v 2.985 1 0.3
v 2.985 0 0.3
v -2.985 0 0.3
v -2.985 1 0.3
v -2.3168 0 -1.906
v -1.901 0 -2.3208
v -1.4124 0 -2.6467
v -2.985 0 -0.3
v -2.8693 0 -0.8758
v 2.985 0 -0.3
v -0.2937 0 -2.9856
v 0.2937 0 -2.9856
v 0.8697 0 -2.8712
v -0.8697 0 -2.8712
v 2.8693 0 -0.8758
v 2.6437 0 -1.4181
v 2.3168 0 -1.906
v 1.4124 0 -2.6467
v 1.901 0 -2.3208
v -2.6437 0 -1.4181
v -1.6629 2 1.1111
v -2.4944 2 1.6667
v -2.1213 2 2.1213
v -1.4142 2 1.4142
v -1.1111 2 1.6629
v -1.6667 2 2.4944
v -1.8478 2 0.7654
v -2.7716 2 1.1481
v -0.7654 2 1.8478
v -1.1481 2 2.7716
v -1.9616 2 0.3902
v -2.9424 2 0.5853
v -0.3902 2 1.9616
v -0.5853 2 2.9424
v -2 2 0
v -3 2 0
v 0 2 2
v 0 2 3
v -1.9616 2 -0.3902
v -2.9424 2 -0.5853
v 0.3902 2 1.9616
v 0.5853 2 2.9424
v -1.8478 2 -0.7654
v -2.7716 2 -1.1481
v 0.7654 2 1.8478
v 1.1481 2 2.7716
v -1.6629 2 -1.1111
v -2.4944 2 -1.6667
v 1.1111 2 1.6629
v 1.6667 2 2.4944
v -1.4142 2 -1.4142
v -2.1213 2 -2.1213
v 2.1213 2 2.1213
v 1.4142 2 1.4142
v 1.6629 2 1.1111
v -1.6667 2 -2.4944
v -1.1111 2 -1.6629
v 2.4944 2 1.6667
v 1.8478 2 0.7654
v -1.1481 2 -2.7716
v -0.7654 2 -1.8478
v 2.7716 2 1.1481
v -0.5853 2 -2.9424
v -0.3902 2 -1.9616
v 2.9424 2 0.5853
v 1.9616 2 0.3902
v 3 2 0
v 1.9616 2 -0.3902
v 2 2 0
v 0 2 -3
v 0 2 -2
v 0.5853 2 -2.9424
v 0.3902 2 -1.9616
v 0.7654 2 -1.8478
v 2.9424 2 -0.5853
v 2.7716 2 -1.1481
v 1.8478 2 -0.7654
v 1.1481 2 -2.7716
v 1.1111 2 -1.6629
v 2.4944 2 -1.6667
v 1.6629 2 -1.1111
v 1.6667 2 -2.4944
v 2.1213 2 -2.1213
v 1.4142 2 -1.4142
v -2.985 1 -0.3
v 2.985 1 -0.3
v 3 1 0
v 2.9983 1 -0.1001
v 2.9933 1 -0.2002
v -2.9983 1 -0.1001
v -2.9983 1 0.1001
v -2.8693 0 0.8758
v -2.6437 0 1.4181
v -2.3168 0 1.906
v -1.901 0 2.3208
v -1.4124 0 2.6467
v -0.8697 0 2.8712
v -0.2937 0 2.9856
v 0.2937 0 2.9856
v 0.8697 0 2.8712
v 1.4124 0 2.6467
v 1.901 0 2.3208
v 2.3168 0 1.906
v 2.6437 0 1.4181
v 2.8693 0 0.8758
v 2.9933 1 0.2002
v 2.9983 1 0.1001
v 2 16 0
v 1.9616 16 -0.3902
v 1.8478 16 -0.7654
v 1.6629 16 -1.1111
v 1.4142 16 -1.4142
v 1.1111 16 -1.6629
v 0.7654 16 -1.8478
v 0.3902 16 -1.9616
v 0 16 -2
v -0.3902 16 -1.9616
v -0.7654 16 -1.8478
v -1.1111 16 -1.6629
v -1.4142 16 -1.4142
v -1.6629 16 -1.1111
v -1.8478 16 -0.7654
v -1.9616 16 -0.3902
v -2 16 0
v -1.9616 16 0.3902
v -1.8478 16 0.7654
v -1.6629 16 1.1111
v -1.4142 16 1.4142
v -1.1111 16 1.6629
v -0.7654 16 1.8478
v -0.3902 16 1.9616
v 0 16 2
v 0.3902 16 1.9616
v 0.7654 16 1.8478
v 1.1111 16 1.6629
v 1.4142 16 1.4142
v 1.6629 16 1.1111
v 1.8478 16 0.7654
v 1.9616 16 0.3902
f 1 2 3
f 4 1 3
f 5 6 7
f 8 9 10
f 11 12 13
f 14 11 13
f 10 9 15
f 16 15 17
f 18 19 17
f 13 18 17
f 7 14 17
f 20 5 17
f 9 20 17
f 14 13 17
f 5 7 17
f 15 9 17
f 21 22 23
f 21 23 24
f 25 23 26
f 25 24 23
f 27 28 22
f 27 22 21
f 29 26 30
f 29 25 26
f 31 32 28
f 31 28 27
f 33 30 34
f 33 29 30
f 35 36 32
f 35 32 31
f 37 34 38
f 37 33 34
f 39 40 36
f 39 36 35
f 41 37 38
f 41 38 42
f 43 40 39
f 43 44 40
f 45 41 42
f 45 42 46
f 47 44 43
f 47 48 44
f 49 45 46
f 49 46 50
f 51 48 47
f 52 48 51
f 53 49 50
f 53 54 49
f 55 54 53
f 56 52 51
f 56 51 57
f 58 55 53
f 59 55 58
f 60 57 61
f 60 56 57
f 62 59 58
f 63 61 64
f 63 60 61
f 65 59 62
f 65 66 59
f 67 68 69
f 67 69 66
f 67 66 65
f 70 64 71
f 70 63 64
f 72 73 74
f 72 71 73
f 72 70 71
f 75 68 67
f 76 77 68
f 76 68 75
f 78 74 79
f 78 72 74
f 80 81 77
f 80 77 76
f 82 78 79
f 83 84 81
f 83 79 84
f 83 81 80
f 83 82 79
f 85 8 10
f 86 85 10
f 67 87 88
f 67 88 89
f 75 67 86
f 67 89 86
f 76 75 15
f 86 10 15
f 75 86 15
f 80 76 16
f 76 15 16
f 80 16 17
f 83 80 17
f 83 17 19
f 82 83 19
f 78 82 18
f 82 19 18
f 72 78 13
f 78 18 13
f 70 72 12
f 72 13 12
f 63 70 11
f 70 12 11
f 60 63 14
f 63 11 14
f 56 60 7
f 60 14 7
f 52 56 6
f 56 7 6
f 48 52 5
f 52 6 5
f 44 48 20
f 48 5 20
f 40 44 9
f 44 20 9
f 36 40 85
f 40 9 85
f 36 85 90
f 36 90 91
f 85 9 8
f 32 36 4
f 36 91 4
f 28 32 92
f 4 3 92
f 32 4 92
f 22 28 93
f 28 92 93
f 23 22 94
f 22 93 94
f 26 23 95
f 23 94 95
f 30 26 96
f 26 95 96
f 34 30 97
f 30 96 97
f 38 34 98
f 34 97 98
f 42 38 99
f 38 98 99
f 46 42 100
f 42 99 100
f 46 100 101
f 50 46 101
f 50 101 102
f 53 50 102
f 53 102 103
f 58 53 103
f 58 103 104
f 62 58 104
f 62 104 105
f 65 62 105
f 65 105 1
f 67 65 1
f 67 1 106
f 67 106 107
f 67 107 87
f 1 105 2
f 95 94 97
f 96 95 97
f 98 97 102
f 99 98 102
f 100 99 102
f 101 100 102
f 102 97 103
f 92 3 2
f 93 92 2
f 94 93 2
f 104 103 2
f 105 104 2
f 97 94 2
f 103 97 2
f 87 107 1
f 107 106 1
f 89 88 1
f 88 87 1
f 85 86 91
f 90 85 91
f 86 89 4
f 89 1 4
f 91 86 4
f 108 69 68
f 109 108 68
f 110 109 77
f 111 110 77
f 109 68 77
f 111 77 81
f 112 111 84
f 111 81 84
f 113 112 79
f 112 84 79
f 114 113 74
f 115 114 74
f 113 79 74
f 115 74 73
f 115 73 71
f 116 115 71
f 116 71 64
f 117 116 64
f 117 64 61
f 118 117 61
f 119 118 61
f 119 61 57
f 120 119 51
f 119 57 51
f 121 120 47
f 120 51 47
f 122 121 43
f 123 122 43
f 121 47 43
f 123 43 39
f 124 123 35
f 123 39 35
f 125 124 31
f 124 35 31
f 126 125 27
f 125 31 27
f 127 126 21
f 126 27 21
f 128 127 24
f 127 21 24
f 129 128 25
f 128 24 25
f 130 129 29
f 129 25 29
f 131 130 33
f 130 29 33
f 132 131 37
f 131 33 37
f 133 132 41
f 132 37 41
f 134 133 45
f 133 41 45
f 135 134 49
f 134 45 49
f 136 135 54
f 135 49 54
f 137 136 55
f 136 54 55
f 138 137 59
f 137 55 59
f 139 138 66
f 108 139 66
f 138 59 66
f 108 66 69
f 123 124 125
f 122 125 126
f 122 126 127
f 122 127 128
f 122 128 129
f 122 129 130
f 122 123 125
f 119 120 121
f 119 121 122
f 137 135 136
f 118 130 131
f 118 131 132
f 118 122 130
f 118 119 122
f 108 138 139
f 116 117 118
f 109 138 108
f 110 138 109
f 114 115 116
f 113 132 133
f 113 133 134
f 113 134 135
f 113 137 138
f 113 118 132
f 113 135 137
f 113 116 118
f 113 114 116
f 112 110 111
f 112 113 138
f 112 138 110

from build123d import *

# Parameters (mm, degrees)
SKETCH1_R           = 3
BOSS_EXTRUDE1_DEPTH = 2
SKETCH2_R           = 2
BOSS_EXTRUDE2_DEPTH = 14
CUT_EXTRUDE2_DEPTH  = 1


with BuildPart() as part:
    # Sketch1 → Boss-Extrude1 (new body)
    with BuildSketch(Plane(origin=(0, 0, 0), x_dir=(1, 0, 0), z_dir=(0, 1, 0))):
        Circle(SKETCH1_R)
    extrude(amount=BOSS_EXTRUDE1_DEPTH)

    # Sketch2 → Boss-Extrude2 (add)
    with BuildSketch(Plane(origin=(0, 2, 0), x_dir=(1, 0, 0), z_dir=(0, 1, 0))):
        Circle(SKETCH2_R)
    extrude(amount=BOSS_EXTRUDE2_DEPTH)

    # Sketch3 → Cut-Extrude2 (cut)
    with BuildSketch(Plane.XZ):
        Polygon((0, 0.3), (3.344738487, 0.3), (3.344738487, 0), (3.344738487, -0.3), (0, -0.3), (-3.50820315, -0.3), (-3.50820315, 0), (-3.50820315, 0.3), align=None)
    extrude(amount=-CUT_EXTRUDE2_DEPTH, mode=Mode.SUBTRACT)


solid = part.part
